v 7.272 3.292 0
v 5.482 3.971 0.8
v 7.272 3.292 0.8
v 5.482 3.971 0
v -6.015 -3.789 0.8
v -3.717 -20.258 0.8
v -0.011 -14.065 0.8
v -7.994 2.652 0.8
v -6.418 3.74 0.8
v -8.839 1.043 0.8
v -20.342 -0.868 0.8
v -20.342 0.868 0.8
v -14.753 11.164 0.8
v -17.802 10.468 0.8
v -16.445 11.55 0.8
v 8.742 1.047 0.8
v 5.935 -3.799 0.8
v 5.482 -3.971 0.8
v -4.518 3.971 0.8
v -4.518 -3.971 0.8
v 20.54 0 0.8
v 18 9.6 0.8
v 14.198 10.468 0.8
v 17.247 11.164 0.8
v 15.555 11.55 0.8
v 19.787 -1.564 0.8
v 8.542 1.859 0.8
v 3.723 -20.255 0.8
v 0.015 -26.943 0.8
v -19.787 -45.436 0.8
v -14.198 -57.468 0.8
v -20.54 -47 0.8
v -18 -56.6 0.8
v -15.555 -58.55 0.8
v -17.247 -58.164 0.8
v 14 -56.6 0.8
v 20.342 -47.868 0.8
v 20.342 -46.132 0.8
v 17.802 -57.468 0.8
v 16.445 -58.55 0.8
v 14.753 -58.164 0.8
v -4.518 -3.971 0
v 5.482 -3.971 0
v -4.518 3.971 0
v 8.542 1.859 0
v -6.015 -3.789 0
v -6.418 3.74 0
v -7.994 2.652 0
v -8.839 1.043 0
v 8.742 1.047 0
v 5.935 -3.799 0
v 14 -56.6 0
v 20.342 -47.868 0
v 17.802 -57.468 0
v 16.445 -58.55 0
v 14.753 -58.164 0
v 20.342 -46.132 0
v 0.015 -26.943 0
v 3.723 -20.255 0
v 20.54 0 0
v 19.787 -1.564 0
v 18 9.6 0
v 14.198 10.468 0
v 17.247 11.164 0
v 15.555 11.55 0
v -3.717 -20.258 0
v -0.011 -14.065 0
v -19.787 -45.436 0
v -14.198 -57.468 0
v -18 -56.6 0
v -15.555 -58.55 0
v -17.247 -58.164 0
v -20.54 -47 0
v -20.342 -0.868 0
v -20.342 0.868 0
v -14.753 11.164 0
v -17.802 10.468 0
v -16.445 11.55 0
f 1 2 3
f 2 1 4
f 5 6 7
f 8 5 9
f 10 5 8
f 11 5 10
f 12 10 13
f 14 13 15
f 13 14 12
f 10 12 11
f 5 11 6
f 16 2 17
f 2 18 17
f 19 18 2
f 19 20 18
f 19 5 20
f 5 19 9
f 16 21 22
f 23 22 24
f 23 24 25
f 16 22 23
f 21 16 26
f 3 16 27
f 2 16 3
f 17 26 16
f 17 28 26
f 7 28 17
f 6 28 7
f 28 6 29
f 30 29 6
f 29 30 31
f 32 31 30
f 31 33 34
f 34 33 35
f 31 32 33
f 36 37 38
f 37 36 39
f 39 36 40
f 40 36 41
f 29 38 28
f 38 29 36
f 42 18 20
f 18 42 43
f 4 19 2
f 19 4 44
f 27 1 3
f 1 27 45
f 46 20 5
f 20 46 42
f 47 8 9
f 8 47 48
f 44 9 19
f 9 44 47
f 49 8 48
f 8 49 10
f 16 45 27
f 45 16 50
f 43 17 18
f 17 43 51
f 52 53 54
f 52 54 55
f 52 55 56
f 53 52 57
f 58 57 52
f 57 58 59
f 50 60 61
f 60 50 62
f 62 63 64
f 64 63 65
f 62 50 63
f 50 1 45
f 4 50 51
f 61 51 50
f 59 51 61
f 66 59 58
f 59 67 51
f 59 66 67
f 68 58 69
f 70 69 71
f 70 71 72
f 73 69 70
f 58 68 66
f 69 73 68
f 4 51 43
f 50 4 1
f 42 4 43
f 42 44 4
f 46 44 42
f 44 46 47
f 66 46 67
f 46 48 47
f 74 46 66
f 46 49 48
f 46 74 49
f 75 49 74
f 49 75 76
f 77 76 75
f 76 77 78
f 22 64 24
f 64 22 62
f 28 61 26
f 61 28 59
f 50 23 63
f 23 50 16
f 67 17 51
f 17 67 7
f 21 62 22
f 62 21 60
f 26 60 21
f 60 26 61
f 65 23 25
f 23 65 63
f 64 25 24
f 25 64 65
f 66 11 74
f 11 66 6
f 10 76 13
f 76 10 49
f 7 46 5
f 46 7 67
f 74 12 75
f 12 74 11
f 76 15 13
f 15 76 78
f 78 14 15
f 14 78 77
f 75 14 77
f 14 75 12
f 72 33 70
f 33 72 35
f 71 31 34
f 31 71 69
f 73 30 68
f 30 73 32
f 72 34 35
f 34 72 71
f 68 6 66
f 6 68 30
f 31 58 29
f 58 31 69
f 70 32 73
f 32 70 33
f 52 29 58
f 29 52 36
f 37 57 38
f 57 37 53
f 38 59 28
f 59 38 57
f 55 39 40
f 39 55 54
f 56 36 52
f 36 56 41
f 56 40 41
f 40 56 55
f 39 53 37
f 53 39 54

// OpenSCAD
pcbThick = 0.8;
batteryCenterDist = 16;
hull(){
translate([-5,0,0])
cylinder(r=4, h=pcbThick);
translate([5,0,0])
cylinder(r=4, h=pcbThick);
}

hull(){
translate([batteryCenterDist,0,0])
batteryClip();
translate([0,-20,0])
cylinder(r=3,h=pcbThick);
}

hull(){
translate([-batteryCenterDist,0,0])
batteryClip();
translate([0,-20,0])
cylinder(r=3,h=pcbThick);
}


hull(){
translate([-batteryCenterDist,-47,0])
rotate([0,0,180])
batteryClip();
translate([0,-20,0])
cylinder(r=3,h=pcbThick);
}

hull(){
translate([batteryCenterDist,-47,0])
rotate([0,0,180])
batteryClip();
translate([0,-20,0])
cylinder(r=3,h=pcbThick);
}


module batteryClip(){
hull(){
translate([-5.08/2,0,0])
cylinder(r=2,h=pcbThick);
translate([5.08/2,0,0])
cylinder(r=2,h=pcbThick);

translate([0,9.6,0])
cylinder(r=2,h=pcbThick);
}
}
